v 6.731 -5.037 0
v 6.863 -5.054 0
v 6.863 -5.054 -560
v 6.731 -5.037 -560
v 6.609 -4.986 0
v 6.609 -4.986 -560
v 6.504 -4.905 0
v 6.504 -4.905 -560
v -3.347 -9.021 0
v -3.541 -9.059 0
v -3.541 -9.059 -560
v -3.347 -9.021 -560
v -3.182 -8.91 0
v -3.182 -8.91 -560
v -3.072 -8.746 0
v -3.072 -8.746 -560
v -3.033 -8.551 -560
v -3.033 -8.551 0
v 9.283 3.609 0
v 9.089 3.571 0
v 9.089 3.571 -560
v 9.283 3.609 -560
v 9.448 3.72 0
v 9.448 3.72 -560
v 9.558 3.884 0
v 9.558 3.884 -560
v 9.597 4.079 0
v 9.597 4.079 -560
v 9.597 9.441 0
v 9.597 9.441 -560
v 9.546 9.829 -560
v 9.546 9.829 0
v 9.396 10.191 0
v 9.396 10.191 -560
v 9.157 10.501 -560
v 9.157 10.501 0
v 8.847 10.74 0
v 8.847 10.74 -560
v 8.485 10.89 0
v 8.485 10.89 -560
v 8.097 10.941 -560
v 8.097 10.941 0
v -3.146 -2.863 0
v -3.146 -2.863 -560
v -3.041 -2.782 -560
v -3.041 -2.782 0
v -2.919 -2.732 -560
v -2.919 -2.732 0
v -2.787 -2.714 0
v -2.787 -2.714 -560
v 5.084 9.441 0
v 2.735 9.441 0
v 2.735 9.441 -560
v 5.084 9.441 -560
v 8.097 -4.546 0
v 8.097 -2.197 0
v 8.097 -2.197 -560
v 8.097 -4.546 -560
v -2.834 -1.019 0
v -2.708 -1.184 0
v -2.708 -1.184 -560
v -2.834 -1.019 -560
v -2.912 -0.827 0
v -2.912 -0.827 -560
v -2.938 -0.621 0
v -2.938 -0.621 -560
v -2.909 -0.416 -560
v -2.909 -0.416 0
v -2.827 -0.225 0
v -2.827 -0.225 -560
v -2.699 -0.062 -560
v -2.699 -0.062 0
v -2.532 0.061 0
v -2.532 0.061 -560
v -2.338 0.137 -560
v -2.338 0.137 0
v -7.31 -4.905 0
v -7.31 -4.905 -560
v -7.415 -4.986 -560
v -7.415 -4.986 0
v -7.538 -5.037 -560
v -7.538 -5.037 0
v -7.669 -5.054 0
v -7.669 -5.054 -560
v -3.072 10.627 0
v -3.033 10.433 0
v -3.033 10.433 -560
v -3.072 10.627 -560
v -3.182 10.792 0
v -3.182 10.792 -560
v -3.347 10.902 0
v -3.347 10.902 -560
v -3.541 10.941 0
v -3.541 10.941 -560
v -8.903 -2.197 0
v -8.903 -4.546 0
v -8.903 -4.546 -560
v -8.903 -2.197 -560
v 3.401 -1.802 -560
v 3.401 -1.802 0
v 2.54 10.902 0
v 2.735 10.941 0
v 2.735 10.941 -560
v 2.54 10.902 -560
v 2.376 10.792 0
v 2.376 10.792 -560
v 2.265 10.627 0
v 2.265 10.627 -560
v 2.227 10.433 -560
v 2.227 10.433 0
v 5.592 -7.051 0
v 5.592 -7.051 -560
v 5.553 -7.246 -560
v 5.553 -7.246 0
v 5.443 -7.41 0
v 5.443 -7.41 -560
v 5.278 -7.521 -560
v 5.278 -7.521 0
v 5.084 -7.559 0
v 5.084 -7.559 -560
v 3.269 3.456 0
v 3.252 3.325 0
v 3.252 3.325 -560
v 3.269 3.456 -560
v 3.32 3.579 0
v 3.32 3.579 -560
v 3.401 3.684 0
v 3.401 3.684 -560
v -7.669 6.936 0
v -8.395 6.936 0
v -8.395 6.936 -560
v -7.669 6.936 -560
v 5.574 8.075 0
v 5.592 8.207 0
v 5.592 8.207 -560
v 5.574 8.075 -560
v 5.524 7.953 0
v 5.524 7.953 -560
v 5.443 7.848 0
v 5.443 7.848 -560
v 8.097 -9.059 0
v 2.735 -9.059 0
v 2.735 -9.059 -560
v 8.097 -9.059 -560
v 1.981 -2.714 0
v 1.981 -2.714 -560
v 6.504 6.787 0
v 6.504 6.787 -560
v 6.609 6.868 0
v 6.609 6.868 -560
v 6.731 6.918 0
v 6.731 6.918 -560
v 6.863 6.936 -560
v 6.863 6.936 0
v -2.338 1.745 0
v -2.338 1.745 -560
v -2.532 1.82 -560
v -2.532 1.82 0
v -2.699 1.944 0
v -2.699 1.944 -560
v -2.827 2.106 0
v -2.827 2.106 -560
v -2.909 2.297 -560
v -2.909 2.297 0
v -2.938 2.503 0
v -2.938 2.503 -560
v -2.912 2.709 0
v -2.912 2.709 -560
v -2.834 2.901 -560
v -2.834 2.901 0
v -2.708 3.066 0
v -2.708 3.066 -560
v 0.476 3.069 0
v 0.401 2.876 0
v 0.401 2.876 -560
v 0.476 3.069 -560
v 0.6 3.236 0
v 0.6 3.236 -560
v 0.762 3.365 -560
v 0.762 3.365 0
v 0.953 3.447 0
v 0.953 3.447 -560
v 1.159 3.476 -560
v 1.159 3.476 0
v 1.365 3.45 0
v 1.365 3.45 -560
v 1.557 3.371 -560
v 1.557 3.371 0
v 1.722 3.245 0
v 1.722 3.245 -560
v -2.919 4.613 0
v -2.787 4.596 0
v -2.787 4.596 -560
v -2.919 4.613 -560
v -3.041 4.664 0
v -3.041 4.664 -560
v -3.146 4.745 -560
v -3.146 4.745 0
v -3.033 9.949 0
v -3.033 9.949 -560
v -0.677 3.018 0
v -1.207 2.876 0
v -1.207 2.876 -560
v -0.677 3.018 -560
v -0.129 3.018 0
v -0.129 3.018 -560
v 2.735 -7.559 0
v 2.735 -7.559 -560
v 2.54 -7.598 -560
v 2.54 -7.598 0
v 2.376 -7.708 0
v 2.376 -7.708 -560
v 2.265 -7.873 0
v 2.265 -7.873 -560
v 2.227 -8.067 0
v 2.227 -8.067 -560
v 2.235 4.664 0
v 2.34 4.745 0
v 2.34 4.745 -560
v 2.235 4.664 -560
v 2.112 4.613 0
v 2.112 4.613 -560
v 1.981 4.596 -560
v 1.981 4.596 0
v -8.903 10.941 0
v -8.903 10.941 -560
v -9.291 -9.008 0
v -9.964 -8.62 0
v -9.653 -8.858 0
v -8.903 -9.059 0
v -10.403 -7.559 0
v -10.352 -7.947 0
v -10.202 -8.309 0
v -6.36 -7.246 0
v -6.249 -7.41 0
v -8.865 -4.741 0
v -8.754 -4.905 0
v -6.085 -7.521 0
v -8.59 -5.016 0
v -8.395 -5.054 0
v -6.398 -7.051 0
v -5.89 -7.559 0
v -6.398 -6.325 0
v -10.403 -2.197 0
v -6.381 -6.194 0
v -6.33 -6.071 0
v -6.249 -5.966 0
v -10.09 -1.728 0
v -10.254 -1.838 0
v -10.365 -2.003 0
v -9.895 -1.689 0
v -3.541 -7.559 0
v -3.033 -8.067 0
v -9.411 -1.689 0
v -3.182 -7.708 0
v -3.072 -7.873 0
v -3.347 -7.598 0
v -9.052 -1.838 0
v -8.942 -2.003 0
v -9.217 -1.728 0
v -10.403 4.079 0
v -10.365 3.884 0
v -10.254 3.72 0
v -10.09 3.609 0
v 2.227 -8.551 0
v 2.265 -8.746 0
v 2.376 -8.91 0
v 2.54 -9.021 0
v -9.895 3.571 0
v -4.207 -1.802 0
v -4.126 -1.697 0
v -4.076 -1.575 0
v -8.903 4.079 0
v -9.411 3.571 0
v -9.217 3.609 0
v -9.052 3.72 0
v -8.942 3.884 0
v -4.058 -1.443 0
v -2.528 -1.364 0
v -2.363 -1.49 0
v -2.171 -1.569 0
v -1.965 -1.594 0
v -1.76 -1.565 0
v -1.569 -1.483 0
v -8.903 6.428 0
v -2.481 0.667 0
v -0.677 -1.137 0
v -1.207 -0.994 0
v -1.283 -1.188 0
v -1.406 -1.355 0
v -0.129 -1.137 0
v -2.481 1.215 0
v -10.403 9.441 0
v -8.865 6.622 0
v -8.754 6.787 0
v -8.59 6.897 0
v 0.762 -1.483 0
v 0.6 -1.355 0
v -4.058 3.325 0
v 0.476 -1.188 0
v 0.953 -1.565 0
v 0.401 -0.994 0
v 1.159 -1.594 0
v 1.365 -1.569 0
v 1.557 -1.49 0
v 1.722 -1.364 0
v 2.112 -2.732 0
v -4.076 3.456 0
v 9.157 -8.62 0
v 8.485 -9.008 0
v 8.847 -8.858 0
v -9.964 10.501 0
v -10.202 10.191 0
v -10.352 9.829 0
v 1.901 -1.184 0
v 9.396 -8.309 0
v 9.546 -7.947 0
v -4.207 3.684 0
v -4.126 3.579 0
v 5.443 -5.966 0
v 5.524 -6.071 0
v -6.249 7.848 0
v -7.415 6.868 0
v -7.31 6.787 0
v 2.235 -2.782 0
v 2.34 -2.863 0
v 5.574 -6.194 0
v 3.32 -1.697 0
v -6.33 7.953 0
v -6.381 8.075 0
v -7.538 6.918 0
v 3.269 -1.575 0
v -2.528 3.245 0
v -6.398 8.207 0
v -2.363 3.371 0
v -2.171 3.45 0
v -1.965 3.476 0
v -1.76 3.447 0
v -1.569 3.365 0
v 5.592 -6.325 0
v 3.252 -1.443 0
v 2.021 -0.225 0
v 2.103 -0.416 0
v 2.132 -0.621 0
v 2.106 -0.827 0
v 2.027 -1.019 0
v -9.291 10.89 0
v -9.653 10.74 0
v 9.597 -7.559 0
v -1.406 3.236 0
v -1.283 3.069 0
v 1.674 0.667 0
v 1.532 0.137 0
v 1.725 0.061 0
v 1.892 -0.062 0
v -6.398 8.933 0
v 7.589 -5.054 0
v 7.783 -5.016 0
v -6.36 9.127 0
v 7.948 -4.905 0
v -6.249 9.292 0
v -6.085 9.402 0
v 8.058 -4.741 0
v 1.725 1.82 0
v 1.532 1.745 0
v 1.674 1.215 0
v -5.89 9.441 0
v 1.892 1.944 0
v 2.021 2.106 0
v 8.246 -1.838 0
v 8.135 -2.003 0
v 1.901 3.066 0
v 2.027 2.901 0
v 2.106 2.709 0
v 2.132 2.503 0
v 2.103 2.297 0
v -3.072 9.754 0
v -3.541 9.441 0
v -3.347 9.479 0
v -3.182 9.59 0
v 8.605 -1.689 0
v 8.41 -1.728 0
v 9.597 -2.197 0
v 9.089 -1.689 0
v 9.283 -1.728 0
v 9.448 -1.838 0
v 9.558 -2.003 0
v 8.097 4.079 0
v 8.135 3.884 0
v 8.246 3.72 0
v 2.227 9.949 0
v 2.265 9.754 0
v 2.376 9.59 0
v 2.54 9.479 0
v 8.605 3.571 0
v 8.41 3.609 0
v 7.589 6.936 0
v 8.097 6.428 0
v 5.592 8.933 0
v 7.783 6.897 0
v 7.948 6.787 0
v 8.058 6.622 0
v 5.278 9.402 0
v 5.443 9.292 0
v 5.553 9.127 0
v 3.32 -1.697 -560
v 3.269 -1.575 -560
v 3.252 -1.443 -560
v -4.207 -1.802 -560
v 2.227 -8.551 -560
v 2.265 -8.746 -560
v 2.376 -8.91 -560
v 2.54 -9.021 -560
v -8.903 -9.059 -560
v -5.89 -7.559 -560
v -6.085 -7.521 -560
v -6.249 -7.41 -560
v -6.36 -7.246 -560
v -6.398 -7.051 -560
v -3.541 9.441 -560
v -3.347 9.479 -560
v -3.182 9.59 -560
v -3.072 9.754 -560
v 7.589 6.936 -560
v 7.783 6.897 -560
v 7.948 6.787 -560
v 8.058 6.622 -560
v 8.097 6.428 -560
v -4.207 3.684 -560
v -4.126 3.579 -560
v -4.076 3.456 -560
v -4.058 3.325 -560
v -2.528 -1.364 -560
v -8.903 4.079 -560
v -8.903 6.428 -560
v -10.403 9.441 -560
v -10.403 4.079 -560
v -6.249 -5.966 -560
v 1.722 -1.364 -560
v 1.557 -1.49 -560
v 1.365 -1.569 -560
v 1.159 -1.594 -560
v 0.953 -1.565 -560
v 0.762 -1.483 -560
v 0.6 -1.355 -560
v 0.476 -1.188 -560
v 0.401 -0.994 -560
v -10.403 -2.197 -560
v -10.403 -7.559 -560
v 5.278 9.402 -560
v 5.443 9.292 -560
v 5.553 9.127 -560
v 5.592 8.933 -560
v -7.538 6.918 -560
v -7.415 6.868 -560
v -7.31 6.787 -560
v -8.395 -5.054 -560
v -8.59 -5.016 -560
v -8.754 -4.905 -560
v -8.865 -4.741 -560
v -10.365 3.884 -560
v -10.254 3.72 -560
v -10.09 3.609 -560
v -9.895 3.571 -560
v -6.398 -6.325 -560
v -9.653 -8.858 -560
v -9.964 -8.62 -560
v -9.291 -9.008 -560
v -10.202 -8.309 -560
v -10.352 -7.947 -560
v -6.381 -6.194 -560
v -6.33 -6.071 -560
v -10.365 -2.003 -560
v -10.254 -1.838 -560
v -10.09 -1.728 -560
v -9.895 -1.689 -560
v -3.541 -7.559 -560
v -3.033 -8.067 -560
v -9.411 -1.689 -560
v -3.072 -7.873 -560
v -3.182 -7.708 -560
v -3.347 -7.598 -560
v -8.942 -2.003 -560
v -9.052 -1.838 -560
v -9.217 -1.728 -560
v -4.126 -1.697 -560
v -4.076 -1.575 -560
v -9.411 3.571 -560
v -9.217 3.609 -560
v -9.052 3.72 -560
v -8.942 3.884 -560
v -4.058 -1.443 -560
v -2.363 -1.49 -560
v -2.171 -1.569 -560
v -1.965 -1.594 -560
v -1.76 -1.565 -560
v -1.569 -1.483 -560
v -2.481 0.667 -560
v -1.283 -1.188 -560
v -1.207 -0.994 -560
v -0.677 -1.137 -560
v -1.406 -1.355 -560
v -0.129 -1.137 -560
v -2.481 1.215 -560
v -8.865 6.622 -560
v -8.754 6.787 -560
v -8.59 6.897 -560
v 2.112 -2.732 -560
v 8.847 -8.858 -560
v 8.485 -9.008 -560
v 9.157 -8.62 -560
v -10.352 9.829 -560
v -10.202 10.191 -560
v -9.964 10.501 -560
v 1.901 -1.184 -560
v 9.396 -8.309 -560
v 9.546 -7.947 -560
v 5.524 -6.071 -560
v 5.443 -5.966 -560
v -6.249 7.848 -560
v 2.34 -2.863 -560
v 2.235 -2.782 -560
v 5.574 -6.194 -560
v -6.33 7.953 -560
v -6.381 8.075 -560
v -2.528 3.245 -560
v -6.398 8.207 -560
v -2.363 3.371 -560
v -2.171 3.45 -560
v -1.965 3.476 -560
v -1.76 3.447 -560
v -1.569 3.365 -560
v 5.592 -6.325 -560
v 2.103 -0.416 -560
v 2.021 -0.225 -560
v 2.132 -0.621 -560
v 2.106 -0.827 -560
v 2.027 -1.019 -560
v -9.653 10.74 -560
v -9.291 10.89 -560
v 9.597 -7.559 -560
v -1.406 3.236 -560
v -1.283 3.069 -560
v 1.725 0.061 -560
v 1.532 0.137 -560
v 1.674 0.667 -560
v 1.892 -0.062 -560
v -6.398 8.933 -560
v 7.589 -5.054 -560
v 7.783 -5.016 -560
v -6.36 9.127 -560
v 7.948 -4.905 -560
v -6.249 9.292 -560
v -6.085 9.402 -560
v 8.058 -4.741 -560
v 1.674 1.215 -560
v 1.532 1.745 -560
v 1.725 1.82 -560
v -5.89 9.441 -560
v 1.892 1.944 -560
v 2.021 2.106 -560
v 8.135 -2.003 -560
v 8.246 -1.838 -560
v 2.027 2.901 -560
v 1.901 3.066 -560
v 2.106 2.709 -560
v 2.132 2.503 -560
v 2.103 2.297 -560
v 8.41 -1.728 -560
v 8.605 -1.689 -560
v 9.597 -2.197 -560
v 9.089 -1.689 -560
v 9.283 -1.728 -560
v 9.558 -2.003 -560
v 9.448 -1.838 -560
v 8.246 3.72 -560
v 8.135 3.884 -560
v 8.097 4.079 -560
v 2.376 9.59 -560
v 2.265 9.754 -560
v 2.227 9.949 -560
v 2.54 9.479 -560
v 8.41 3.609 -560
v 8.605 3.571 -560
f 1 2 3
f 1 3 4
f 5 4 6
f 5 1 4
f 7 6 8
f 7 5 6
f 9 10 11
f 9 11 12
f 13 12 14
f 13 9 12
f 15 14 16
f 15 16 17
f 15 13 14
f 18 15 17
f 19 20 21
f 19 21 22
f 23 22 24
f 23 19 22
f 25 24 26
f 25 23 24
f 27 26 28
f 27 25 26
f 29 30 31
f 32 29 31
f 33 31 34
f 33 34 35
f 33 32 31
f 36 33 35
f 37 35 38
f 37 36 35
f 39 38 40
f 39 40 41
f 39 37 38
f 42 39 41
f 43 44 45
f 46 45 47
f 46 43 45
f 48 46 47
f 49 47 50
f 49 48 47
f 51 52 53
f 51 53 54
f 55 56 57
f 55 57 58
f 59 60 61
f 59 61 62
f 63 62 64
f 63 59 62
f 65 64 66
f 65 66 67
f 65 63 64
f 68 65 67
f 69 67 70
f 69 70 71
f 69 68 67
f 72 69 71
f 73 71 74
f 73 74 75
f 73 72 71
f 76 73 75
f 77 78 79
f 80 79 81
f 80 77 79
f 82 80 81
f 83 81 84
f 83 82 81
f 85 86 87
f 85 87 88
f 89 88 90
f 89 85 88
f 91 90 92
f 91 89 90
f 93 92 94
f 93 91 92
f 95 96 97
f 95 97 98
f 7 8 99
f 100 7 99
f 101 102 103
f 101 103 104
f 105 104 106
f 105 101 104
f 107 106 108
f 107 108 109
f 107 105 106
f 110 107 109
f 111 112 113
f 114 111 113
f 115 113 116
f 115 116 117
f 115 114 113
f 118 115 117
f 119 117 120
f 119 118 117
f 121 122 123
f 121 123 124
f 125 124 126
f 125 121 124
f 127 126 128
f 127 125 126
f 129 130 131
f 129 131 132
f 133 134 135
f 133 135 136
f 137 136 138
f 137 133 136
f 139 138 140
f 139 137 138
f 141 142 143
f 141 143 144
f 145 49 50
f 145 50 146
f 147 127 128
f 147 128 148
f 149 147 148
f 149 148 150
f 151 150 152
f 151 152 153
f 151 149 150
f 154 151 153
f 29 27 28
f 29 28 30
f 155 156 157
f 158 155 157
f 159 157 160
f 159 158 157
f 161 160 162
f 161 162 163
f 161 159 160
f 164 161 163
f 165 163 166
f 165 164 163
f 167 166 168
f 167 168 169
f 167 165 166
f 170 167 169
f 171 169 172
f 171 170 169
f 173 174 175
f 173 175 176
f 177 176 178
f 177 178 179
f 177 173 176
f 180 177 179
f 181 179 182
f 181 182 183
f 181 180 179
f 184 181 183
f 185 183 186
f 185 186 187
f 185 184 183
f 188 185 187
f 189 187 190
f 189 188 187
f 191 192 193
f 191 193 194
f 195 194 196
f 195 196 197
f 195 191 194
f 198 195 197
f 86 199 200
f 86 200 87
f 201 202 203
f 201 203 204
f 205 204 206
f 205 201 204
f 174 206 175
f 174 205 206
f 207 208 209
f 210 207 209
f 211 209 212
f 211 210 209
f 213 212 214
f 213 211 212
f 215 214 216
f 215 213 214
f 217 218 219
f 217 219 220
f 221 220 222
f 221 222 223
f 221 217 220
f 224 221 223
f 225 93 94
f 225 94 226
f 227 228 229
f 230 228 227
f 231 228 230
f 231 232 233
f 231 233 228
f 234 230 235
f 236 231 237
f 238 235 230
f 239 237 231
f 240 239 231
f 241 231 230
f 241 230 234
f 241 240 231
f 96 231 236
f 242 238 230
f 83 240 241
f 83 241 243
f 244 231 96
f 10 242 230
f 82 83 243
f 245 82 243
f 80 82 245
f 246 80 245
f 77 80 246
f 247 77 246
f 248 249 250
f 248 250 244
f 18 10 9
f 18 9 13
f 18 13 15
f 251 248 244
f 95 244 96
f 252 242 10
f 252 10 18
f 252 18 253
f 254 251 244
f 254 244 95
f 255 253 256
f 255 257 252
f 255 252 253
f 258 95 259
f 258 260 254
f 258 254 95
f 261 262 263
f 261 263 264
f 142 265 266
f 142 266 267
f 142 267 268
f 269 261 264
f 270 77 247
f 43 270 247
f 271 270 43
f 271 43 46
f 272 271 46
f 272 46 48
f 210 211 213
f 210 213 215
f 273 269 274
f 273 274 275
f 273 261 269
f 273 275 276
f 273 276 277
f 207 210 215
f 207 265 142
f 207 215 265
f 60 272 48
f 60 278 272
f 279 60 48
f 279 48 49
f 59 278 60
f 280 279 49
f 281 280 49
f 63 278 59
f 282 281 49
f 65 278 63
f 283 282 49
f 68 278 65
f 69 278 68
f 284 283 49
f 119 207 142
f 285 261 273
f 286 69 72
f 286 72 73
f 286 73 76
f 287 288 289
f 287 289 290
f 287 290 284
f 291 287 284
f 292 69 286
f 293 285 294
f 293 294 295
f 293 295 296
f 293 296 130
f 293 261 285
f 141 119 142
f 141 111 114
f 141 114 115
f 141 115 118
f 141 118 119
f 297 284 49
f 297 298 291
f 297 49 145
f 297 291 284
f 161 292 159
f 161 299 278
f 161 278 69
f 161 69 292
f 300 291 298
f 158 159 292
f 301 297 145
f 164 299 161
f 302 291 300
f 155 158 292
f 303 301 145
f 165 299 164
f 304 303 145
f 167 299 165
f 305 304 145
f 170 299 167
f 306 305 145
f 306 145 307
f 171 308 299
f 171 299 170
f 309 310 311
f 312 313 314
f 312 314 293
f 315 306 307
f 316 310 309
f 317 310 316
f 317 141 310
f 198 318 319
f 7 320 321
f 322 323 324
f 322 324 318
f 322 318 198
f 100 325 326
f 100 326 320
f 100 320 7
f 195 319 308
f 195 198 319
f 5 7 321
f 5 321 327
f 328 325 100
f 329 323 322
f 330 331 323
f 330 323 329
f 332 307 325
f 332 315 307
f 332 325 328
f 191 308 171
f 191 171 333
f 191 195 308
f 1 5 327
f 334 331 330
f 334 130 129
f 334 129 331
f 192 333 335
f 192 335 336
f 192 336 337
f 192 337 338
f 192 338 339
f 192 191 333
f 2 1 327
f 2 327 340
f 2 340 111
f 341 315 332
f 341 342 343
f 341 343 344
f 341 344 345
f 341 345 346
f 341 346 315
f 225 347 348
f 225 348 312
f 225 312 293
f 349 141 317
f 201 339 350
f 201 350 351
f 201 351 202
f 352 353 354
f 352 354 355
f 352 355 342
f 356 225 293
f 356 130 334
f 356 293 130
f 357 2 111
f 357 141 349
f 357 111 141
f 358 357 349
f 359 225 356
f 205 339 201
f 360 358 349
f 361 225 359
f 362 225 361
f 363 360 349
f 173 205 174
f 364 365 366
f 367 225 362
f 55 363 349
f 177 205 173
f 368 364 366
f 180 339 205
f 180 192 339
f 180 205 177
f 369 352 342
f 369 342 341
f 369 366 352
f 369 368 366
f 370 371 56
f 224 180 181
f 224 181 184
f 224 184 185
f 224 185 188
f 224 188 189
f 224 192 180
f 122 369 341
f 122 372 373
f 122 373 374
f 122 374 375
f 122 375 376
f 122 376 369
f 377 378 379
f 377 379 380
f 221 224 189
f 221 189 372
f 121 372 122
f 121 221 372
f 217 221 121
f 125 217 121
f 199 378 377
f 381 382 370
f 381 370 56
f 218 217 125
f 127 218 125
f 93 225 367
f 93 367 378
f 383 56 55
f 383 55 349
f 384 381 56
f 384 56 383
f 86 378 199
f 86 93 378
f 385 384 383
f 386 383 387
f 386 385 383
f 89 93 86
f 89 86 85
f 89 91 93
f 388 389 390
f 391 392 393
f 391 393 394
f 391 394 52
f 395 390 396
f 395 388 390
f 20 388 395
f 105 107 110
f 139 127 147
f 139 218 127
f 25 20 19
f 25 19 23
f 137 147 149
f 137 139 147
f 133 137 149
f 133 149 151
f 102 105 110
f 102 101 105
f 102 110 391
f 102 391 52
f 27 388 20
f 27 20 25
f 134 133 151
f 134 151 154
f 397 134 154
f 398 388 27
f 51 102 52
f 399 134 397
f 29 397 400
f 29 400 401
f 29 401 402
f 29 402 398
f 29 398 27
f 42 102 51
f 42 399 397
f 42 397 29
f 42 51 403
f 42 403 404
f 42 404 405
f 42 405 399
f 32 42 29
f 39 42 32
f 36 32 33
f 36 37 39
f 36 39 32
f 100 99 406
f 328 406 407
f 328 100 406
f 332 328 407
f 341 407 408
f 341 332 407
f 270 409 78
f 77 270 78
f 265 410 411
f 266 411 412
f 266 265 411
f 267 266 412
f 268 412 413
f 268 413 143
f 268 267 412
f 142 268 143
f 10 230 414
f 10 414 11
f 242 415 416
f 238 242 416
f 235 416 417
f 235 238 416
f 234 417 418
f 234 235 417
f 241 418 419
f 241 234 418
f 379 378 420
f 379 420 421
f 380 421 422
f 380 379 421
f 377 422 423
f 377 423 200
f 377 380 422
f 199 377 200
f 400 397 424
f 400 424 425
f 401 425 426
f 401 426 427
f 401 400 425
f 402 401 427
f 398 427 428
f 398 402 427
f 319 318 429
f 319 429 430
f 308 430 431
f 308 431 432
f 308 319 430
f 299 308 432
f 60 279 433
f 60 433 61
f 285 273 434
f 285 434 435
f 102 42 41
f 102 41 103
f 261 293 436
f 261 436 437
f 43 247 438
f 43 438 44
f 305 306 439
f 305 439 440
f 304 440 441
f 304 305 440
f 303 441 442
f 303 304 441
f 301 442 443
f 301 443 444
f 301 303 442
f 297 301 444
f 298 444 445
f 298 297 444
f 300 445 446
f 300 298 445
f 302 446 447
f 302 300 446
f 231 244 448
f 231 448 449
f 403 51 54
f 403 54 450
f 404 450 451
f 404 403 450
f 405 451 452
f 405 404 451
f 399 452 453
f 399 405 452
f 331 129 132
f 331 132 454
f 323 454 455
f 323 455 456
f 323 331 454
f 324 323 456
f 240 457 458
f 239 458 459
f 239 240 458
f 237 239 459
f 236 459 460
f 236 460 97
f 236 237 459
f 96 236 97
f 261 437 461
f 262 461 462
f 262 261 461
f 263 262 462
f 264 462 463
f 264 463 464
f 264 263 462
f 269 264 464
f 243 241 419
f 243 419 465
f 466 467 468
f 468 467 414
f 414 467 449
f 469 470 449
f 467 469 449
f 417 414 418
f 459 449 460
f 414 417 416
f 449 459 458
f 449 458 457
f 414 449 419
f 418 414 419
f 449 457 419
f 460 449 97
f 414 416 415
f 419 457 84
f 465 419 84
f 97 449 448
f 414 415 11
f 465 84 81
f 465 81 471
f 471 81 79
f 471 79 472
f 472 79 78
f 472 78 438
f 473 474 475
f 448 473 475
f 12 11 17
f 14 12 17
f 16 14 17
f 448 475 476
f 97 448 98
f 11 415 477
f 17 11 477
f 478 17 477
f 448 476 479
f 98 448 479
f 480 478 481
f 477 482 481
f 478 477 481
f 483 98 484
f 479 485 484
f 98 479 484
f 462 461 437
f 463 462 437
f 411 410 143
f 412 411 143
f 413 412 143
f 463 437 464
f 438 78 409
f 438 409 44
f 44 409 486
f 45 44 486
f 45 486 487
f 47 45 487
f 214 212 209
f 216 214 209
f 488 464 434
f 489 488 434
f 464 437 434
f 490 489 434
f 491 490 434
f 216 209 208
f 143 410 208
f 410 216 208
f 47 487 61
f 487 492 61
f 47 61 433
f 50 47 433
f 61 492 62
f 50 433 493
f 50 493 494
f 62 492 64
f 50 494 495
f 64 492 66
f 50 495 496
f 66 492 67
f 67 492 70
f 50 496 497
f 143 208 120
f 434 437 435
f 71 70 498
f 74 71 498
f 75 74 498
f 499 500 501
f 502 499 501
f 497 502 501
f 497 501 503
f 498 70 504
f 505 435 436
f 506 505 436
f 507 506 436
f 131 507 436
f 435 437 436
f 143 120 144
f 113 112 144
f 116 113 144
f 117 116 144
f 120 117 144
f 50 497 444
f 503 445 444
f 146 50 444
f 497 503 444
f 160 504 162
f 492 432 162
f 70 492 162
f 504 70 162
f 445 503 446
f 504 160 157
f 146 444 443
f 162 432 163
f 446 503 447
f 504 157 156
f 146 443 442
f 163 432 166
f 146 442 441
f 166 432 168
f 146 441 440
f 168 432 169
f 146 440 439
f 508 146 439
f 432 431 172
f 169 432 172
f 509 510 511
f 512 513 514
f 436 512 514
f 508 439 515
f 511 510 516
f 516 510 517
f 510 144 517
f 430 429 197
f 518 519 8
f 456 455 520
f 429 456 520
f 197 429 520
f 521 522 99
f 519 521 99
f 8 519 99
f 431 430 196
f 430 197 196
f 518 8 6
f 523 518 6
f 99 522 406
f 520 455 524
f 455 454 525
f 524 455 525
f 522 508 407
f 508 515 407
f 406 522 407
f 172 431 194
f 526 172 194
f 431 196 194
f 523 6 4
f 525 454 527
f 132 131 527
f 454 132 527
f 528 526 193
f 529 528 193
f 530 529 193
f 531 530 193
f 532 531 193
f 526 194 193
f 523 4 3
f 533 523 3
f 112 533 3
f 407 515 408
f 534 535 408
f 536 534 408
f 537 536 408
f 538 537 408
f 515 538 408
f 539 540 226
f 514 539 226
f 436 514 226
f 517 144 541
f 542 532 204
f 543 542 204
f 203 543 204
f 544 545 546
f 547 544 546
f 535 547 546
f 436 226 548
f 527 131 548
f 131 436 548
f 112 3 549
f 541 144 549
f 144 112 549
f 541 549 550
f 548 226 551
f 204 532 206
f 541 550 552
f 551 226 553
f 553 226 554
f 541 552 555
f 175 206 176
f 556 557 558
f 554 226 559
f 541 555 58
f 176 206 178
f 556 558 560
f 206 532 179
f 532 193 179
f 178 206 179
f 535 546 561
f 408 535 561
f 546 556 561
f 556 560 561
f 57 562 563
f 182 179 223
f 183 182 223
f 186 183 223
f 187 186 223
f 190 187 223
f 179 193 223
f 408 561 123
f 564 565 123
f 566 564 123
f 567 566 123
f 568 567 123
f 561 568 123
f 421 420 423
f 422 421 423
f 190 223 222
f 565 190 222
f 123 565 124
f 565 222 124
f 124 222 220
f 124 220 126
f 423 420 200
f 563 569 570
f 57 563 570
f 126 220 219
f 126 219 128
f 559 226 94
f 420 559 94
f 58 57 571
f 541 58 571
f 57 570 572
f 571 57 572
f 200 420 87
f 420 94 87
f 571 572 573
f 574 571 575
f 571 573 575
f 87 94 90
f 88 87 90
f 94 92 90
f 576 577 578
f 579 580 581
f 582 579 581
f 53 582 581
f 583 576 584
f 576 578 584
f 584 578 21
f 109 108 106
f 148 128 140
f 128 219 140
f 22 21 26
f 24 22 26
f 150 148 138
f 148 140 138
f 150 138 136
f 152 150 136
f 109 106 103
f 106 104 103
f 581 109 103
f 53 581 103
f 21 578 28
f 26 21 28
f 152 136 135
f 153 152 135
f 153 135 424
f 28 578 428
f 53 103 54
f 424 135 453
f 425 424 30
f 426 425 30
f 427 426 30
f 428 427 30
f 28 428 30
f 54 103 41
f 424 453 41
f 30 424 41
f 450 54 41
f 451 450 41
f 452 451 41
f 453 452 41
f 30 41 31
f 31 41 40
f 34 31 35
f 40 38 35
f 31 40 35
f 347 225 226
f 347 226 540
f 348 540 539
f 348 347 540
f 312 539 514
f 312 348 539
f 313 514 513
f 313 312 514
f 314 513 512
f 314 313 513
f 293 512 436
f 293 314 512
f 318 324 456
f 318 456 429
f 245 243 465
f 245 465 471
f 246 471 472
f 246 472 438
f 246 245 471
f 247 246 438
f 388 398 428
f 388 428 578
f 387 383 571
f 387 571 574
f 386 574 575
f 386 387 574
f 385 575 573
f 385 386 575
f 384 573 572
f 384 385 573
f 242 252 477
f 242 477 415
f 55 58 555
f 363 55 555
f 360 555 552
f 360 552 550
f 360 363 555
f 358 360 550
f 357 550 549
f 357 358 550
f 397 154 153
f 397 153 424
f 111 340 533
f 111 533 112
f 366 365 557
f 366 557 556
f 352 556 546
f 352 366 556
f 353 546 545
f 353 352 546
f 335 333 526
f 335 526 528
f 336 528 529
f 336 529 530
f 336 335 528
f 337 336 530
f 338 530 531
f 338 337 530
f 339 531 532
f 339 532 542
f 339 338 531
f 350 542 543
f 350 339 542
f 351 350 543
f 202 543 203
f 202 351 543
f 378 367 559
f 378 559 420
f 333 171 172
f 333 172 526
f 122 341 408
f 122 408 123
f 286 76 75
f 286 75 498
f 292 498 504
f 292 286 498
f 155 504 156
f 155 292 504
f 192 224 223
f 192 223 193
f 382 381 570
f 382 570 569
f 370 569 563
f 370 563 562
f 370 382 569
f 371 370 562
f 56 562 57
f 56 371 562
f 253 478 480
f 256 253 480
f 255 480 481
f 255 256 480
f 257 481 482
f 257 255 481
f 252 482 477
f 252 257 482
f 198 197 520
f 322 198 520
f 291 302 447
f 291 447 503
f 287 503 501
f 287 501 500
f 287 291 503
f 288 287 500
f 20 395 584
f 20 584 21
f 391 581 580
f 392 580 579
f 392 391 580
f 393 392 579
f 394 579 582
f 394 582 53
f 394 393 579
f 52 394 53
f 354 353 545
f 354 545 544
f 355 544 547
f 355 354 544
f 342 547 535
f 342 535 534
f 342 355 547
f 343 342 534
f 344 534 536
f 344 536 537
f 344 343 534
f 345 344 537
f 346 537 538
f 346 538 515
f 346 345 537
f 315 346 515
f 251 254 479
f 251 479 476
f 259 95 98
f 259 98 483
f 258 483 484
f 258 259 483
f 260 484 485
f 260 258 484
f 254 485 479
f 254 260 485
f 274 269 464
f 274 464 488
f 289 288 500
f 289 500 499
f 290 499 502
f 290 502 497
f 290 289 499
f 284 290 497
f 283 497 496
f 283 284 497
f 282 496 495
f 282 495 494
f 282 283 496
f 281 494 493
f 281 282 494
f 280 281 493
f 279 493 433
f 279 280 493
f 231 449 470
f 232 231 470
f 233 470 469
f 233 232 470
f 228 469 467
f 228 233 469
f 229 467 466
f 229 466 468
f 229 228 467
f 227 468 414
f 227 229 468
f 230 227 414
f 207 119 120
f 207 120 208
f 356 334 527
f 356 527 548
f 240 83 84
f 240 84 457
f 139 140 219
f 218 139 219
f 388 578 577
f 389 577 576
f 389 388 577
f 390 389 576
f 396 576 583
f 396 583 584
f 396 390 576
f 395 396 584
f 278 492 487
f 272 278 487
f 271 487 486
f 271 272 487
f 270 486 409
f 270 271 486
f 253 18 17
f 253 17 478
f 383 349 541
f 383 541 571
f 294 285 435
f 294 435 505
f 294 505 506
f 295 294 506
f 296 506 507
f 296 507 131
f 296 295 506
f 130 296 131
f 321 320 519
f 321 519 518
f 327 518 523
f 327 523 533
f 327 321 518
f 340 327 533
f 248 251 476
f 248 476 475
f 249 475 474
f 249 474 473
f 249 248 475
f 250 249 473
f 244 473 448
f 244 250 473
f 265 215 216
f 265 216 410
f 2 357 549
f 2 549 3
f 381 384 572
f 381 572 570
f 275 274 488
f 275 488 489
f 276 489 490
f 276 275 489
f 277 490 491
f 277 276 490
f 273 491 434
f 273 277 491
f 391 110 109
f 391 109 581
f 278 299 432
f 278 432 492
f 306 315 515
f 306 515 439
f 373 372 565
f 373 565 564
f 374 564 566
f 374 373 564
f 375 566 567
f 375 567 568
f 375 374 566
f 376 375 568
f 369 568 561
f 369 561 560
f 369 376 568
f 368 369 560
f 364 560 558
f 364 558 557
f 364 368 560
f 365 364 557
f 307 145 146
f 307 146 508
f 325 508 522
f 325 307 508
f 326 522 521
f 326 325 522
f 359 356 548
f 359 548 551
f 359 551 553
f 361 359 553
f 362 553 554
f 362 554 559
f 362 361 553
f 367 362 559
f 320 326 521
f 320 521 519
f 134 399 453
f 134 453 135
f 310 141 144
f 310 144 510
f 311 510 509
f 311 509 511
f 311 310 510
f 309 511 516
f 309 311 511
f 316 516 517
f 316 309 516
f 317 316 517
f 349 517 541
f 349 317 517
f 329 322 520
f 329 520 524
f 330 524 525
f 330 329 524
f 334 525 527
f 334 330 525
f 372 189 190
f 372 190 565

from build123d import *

# Parameters (mm, degrees)
METRIC_AL_EXTRUSION_20_2020_PROFILE_1_DEPTH = 560


with BuildPart() as part:
    # Sketch19 → Metric al extrusion 20-2020 PROFILE(1) (new body)
    with BuildSketch(Plane(origin=(0, 0, 0), x_dir=(-1, 0, 0), z_dir=(0, 0, -1))):
        with BuildLine():
            Line((9.895192042, 3.57078143), (9.411192042, 3.57078143))
            ThreePointArc((9.411192042, 3.57078143), (9.051981797, 3.719571185), (8.903192042, 4.07878143))
            Line((8.903192042, 4.07878143), (8.903192042, 6.42778143))
            ThreePointArc((8.903192042, 6.42778143), (8.754402286, 6.786991675), (8.395192042, 6.93578143))
            Line((8.395192042, 6.93578143), (7.669272703, 6.93578143))
            ThreePointArc((7.669272703, 6.93578143), (7.474869519, 6.897112233), (7.310062458, 6.786991675))
            Line((7.310062458, 6.786991675), (4.206981797, 3.683911014))
            ThreePointArc((4.206981797, 3.683911014), (4.096861239, 3.519103952), (4.058192042, 3.324700769))
            Line((4.058192042, 3.324700769), (4.058192042, -1.443137908))
            ThreePointArc((4.058192042, -1.443137908), (4.096861239, -1.637541092), (4.206981797, -1.802348153))
            Line((4.206981797, -1.802348153), (7.310062458, -4.905428815))
            ThreePointArc((7.310062458, -4.905428815), (7.474869519, -5.015549372), (7.669272703, -5.05421857))
            Line((7.669272703, -5.05421857), (8.395192042, -5.05421857))
            ThreePointArc((8.395192042, -5.05421857), (8.754402286, -4.905428815), (8.903192042, -4.54621857))
            Line((8.903192042, -4.54621857), (8.903192042, -2.19721857))
            ThreePointArc((8.903192042, -2.19721857), (9.051981797, -1.838008325), (9.411192042, -1.68921857))
            Line((9.411192042, -1.68921857), (9.895192042, -1.68921857))
            ThreePointArc((9.895192042, -1.68921857), (10.254402286, -1.838008325), (10.403192042, -2.19721857))
            Line((10.403192042, -2.19721857), (10.403192042, -7.55921857))
            ThreePointArc((10.403192042, -7.55921857), (9.963852213, -8.619878742), (8.903192042, -9.05921857))
            Line((8.903192042, -9.05921857), (3.541192042, -9.05921857))
            ThreePointArc((3.541192042, -9.05921857), (3.181981797, -8.910428815), (3.033192042, -8.55121857))
            Line((3.033192042, -8.55121857), (3.033192042, -8.06721857))
            ThreePointArc((3.033192042, -8.06721857), (3.181981797, -7.708008325), (3.541192042, -7.55921857))
            Line((3.541192042, -7.55921857), (5.890192042, -7.55921857))
            ThreePointArc((5.890192042, -7.55921857), (6.249402286, -7.410428815), (6.398192042, -7.05121857))
            Line((6.398192042, -7.05121857), (6.398192042, -6.325299231))
            ThreePointArc((6.398192042, -6.325299231), (6.359522844, -6.130896048), (6.249402286, -5.966088986))
            Line((6.249402286, -5.966088986), (3.146321625, -2.863008325))
            ThreePointArc((3.146321625, -2.863008325), (2.981514564, -2.752887767), (2.78711138, -2.71421857))
            Line((2.78711138, -2.71421857), (-1.980727297, -2.71421857))
            ThreePointArc((-1.980727297, -2.71421857), (-2.175130481, -2.752887767), (-2.339937542, -2.863008325))
            Line((-2.339937542, -2.863008325), (-5.443018203, -5.966088986))
            ThreePointArc((-5.443018203, -5.966088986), (-5.553138761, -6.130896048), (-5.591807958, -6.325299231))
            Line((-5.591807958, -6.325299231), (-5.591807958, -7.05121857))
            ThreePointArc((-5.591807958, -7.05121857), (-5.443018203, -7.410428815), (-5.083807958, -7.55921857))
            Line((-5.083807958, -7.55921857), (-2.734807958, -7.55921857))
            ThreePointArc((-2.734807958, -7.55921857), (-2.375597714, -7.708008325), (-2.226807958, -8.06721857))
            Line((-2.226807958, -8.06721857), (-2.226807958, -8.55121857))
            ThreePointArc((-2.226807958, -8.55121857), (-2.375597714, -8.910428815), (-2.734807958, -9.05921857))
            Line((-2.734807958, -9.05921857), (-8.096807958, -9.05921857))
            ThreePointArc((-8.096807958, -9.05921857), (-9.15746813, -8.619878742), (-9.596807958, -7.55921857))
            Line((-9.596807958, -7.55921857), (-9.596807958, -2.19721857))
            ThreePointArc((-9.596807958, -2.19721857), (-9.448018203, -1.838008325), (-9.088807958, -1.68921857))
            Line((-9.088807958, -1.68921857), (-8.604807958, -1.68921857))
            ThreePointArc((-8.604807958, -1.68921857), (-8.245597714, -1.838008325), (-8.096807958, -2.19721857))
            Line((-8.096807958, -2.19721857), (-8.096807958, -4.54621857))
            ThreePointArc((-8.096807958, -4.54621857), (-7.948018203, -4.905428815), (-7.588807958, -5.05421857))
            Line((-7.588807958, -5.05421857), (-6.86288862, -5.05421857))
            ThreePointArc((-6.86288862, -5.05421857), (-6.668485436, -5.015549372), (-6.503678375, -4.905428815))
            Line((-6.503678375, -4.905428815), (-3.400597714, -1.802348153))
            ThreePointArc((-3.400597714, -1.802348153), (-3.290477156, -1.637541092), (-3.251807958, -1.443137908))
            Line((-3.251807958, -1.443137908), (-3.251807958, 3.324700769))
            ThreePointArc((-3.251807958, 3.324700769), (-3.290477156, 3.519103952), (-3.400597714, 3.683911014))
            Line((-3.400597714, 3.683911014), (-6.503678375, 6.786991675))
            ThreePointArc((-6.503678375, 6.786991675), (-6.668485436, 6.897112233), (-6.86288862, 6.93578143))
            Line((-6.86288862, 6.93578143), (-7.588807958, 6.93578143))
            ThreePointArc((-7.588807958, 6.93578143), (-7.948018203, 6.786991675), (-8.096807958, 6.42778143))
            Line((-8.096807958, 6.42778143), (-8.096807958, 4.07878143))
            ThreePointArc((-8.096807958, 4.07878143), (-8.245597714, 3.719571185), (-8.604807958, 3.57078143))
            Line((-8.604807958, 3.57078143), (-9.088807958, 3.57078143))
            ThreePointArc((-9.088807958, 3.57078143), (-9.448018203, 3.719571185), (-9.596807958, 4.07878143))
            Line((-9.596807958, 4.07878143), (-9.596807958, 9.44078143))
            ThreePointArc((-9.596807958, 9.44078143), (-9.15746813, 10.501441602), (-8.096807958, 10.94078143))
            Line((-8.096807958, 10.94078143), (-2.734807958, 10.94078143))
            ThreePointArc((-2.734807958, 10.94078143), (-2.375597714, 10.791991675), (-2.226807958, 10.43278143))
            Line((-2.226807958, 10.43278143), (-2.226807958, 9.94878143))
            ThreePointArc((-2.226807958, 9.94878143), (-2.375597714, 9.589571185), (-2.734807958, 9.44078143))
            Line((-2.734807958, 9.44078143), (-5.083807958, 9.44078143))
            ThreePointArc((-5.083807958, 9.44078143), (-5.443018203, 9.291991675), (-5.591807958, 8.93278143))
            Line((-5.591807958, 8.93278143), (-5.591807958, 8.206862092))
            ThreePointArc((-5.591807958, 8.206862092), (-5.553138761, 8.012458908), (-5.443018203, 7.847651847))
            Line((-5.443018203, 7.847651847), (-2.339937542, 4.744571185))
            ThreePointArc((-2.339937542, 4.744571185), (-2.175130481, 4.634450628), (-1.980727297, 4.59578143))
            Line((-1.980727297, 4.59578143), (2.78711138, 4.59578143))
            ThreePointArc((2.78711138, 4.59578143), (2.981514564, 4.634450628), (3.146321625, 4.744571185))
            Line((3.146321625, 4.744571185), (6.249402286, 7.847651847))
            ThreePointArc((6.249402286, 7.847651847), (6.359522844, 8.012458908), (6.398192042, 8.206862092))
            Line((6.398192042, 8.206862092), (6.398192042, 8.93278143))
            ThreePointArc((6.398192042, 8.93278143), (6.249402286, 9.291991675), (5.890192042, 9.44078143))
            Line((5.890192042, 9.44078143), (3.541192042, 9.44078143))
            ThreePointArc((3.541192042, 9.44078143), (3.181981797, 9.589571185), (3.033192042, 9.94878143))
            Line((3.033192042, 9.94878143), (3.033192042, 10.43278143))
            ThreePointArc((3.033192042, 10.43278143), (3.181981797, 10.791991675), (3.541192042, 10.94078143))
            Line((3.541192042, 10.94078143), (8.903192042, 10.94078143))
            ThreePointArc((8.903192042, 10.94078143), (9.963852213, 10.501441602), (10.403192042, 9.44078143))
            Line((10.403192042, 9.44078143), (10.403192042, 4.07878143))
            ThreePointArc((10.403192042, 4.07878143), (10.254402286, 3.719571185), (9.895192042, 3.57078143))
        make_face()
        with BuildLine():
            Line((2.528092885, -1.363724536), (2.707698008, -1.184119414))
            ThreePointArc((2.707698008, -1.184119414), (2.909130058, -0.415686381), (2.338325548, 0.136804712))
            ThreePointArc((2.338325548, 0.136804712), (2.498692042, 0.94078143), (2.338325548, 1.744758148))
            ThreePointArc((2.338325548, 1.744758148), (2.909130058, 2.297249241), (2.707698008, 3.065682274))
            Line((2.707698008, 3.065682274), (2.528092885, 3.245287396))
            ThreePointArc((2.528092885, 3.245287396), (1.759659852, 3.446719447), (1.20716876, 2.875914936))
            ThreePointArc((1.20716876, 2.875914936), (0.403192042, 3.03628143), (-0.400784676, 2.875914936))
            ThreePointArc((-0.400784676, 2.875914936), (-0.953275769, 3.446719447), (-1.721708802, 3.245287396))
            Line((-1.721708802, 3.245287396), (-1.901313925, 3.065682274))
            ThreePointArc((-1.901313925, 3.065682274), (-2.102745975, 2.297249241), (-1.531941465, 1.744758148))
            ThreePointArc((-1.531941465, 1.744758148), (-1.692307958, 0.94078143), (-1.531941465, 0.136804712))
            ThreePointArc((-1.531941465, 0.136804712), (-2.102745975, -0.415686381), (-1.901313925, -1.184119414))
            Line((-1.901313925, -1.184119414), (-1.721708802, -1.363724536))
            ThreePointArc((-1.721708802, -1.363724536), (-0.953275769, -1.565156587), (-0.400784676, -0.994352076))
            ThreePointArc((-0.400784676, -0.994352076), (0.403192042, -1.15471857), (1.20716876, -0.994352076))
            ThreePointArc((1.20716876, -0.994352076), (1.759659852, -1.565156587), (2.528092885, -1.363724536))
        make_face(mode=Mode.SUBTRACT)
    extrude(amount=METRIC_AL_EXTRUSION_20_2020_PROFILE_1_DEPTH)


solid = part.part
